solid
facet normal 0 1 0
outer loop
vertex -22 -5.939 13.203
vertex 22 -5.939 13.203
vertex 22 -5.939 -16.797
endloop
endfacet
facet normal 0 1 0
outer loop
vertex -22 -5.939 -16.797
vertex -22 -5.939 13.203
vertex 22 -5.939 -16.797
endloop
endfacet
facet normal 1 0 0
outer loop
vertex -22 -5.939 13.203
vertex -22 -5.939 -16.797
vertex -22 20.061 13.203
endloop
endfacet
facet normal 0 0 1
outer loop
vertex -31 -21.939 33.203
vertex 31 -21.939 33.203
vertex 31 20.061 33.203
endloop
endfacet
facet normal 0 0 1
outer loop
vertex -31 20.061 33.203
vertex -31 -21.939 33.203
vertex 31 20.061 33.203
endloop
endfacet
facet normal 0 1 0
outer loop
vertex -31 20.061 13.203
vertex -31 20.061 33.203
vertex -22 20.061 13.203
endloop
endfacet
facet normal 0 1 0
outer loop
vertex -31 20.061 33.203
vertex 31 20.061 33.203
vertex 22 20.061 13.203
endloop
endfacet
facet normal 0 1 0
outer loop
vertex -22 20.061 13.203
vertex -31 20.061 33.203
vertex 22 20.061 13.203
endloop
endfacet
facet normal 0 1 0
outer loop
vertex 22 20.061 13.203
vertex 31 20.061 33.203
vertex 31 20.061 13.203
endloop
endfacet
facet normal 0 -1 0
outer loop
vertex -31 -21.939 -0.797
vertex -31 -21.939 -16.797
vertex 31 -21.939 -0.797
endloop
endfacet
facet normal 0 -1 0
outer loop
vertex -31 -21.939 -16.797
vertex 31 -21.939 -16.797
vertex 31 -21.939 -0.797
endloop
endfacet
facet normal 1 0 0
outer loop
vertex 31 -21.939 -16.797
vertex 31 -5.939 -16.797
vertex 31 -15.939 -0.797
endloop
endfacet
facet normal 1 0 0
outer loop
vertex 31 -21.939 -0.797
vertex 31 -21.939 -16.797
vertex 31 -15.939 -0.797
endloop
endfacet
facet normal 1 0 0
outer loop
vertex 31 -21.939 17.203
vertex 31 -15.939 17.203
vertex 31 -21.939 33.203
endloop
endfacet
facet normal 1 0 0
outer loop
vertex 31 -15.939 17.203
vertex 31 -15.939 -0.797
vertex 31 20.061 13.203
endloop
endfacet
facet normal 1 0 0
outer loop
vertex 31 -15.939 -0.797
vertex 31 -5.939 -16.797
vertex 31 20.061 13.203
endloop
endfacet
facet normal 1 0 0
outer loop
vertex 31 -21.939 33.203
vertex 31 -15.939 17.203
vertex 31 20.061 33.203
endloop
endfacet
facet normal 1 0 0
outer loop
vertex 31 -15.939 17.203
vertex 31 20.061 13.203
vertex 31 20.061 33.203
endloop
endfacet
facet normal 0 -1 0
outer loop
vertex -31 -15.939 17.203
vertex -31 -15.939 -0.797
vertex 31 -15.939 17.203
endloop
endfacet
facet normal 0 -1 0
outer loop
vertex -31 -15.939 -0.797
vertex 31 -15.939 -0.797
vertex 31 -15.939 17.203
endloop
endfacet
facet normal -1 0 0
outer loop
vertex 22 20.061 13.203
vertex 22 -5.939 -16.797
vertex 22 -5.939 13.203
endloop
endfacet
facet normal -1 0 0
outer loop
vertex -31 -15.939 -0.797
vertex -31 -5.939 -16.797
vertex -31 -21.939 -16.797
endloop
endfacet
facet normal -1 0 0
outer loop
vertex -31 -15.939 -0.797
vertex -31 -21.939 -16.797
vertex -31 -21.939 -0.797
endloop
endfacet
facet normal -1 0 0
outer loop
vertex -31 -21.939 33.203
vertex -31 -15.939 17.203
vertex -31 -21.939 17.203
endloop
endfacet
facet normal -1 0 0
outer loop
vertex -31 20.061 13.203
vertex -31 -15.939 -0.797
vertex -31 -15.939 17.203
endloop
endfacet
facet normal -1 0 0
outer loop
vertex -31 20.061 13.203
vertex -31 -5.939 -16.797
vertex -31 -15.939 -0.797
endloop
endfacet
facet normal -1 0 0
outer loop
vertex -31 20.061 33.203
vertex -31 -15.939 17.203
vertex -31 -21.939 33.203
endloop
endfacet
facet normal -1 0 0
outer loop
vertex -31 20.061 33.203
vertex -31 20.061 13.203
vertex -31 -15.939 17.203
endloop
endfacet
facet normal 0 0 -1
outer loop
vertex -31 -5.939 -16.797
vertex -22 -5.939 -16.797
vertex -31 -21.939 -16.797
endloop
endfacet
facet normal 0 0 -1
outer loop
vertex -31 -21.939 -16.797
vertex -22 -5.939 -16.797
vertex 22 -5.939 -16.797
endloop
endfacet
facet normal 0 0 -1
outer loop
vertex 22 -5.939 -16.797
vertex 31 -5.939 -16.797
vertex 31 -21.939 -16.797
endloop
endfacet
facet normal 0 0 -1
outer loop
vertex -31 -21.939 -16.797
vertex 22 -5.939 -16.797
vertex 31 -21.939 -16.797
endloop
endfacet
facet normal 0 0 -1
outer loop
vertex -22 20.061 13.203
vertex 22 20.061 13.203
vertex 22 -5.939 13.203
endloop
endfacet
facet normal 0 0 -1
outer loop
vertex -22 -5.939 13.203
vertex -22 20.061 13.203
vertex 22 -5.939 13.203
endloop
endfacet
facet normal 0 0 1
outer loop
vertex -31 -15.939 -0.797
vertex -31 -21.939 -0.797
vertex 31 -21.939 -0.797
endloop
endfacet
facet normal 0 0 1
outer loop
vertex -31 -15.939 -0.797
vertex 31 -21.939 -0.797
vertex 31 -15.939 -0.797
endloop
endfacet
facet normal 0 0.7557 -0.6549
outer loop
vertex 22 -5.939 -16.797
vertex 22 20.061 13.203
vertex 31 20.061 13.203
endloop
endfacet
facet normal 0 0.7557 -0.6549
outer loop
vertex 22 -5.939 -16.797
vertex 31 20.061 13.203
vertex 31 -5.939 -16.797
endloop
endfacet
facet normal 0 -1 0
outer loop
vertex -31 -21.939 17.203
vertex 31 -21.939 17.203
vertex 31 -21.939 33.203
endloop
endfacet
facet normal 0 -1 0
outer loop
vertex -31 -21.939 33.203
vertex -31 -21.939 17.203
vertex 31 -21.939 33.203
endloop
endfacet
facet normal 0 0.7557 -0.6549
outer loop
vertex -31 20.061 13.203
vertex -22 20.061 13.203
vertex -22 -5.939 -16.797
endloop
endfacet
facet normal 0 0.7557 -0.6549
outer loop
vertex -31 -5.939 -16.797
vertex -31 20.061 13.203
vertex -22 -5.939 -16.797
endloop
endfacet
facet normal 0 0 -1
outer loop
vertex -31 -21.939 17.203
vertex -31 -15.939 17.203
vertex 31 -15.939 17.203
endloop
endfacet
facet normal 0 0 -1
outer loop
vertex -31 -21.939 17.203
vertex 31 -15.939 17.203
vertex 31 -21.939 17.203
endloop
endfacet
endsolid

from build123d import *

# Parameters (mm, degrees)
BOSS_EXTRUDE1_DEPTH = 31
BOSS_EXTRUDE2_START = 22
BOSS_EXTRUDE2_DEPTH = 9
BOSS_EXTRUDE4_START = -22
BOSS_EXTRUDE4_DEPTH = 9


with BuildPart() as part:
    # Sketch1 → Boss-Extrude1 (new, symmetric)
    with BuildSketch(Plane(origin=(0, 0, 0), x_dir=(0, 0, -1), z_dir=(1, 0, 0))):
        Polygon((-13.203112203, 20.060606061), (-33.203112203, 20.060606061), (-33.203112203, -21.939393939), (-17.203112203, -21.939393939), (-17.203112203, -15.939393939), (0.796887797, -15.939393939), (0.796887797, -21.939393939), (16.796887797, -21.939393939), (16.796887797, -5.939393939), (-13.203112203, -5.939393939), align=None)
    extrude(amount=BOSS_EXTRUDE1_DEPTH, both=True)

    # Sketch1<4> → Boss-Extrude2 (add)
    with BuildSketch(Plane(origin=(0, 0, 0), x_dir=(0, 0, -1), z_dir=(1, 0, 0)).offset(BOSS_EXTRUDE2_START)):
        Polygon((16.796887797, -5.939393939), (-13.203112203, 20.060606061), (-13.203112203, -5.939393939), align=None)
    extrude(amount=BOSS_EXTRUDE2_DEPTH)

    # Sketch1<14> → Boss-Extrude4 (add)
    with BuildSketch(Plane(origin=(0, 0, 0), x_dir=(0, 0, -1), z_dir=(1, 0, 0)).offset(BOSS_EXTRUDE4_START)):
        Polygon((16.796887797, -5.939393939), (-13.203112203, 20.060606061), (-13.203112203, -5.939393939), align=None)
    extrude(amount=-BOSS_EXTRUDE4_DEPTH)


solid = part.part
